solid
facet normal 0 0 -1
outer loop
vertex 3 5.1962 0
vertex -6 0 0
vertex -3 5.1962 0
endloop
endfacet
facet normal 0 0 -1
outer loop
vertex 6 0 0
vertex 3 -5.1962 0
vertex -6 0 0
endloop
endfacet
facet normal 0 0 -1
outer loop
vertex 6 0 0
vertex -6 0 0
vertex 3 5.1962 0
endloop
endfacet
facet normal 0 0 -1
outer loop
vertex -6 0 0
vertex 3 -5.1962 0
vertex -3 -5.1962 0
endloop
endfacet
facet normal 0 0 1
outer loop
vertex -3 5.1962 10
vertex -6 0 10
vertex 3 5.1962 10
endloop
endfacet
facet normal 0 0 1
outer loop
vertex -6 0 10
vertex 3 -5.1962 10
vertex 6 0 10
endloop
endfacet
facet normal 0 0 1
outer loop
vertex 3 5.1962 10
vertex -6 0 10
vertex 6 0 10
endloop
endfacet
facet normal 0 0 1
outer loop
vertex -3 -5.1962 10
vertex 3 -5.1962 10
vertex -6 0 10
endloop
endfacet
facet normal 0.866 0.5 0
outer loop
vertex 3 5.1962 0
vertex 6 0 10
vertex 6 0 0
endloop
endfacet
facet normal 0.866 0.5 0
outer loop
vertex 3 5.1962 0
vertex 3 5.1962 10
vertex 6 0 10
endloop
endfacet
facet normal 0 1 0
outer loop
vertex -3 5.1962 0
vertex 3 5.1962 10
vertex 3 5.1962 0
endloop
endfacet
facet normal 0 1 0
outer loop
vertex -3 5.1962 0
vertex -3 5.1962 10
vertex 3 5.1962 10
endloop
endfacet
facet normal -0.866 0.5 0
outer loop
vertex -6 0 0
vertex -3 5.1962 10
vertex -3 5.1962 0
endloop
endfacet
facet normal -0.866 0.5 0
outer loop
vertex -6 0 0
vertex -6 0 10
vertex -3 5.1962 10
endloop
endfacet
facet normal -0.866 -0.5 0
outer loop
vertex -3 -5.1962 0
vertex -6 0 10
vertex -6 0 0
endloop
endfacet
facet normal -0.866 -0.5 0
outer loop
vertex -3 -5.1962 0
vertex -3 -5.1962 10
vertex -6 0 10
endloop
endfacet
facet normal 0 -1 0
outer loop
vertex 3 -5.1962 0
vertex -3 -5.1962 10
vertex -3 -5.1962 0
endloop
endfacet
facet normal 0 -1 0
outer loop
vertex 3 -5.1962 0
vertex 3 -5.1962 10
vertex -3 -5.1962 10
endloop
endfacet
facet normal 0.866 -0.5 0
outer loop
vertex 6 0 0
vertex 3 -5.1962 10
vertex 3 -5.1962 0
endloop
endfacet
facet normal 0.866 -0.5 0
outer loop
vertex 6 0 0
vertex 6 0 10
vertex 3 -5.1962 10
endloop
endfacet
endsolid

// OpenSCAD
// circle($fn=6) is an exact hexagon; extrude -> hex prism.
linear_extrude(10) circle(r=6, $fn=6);
